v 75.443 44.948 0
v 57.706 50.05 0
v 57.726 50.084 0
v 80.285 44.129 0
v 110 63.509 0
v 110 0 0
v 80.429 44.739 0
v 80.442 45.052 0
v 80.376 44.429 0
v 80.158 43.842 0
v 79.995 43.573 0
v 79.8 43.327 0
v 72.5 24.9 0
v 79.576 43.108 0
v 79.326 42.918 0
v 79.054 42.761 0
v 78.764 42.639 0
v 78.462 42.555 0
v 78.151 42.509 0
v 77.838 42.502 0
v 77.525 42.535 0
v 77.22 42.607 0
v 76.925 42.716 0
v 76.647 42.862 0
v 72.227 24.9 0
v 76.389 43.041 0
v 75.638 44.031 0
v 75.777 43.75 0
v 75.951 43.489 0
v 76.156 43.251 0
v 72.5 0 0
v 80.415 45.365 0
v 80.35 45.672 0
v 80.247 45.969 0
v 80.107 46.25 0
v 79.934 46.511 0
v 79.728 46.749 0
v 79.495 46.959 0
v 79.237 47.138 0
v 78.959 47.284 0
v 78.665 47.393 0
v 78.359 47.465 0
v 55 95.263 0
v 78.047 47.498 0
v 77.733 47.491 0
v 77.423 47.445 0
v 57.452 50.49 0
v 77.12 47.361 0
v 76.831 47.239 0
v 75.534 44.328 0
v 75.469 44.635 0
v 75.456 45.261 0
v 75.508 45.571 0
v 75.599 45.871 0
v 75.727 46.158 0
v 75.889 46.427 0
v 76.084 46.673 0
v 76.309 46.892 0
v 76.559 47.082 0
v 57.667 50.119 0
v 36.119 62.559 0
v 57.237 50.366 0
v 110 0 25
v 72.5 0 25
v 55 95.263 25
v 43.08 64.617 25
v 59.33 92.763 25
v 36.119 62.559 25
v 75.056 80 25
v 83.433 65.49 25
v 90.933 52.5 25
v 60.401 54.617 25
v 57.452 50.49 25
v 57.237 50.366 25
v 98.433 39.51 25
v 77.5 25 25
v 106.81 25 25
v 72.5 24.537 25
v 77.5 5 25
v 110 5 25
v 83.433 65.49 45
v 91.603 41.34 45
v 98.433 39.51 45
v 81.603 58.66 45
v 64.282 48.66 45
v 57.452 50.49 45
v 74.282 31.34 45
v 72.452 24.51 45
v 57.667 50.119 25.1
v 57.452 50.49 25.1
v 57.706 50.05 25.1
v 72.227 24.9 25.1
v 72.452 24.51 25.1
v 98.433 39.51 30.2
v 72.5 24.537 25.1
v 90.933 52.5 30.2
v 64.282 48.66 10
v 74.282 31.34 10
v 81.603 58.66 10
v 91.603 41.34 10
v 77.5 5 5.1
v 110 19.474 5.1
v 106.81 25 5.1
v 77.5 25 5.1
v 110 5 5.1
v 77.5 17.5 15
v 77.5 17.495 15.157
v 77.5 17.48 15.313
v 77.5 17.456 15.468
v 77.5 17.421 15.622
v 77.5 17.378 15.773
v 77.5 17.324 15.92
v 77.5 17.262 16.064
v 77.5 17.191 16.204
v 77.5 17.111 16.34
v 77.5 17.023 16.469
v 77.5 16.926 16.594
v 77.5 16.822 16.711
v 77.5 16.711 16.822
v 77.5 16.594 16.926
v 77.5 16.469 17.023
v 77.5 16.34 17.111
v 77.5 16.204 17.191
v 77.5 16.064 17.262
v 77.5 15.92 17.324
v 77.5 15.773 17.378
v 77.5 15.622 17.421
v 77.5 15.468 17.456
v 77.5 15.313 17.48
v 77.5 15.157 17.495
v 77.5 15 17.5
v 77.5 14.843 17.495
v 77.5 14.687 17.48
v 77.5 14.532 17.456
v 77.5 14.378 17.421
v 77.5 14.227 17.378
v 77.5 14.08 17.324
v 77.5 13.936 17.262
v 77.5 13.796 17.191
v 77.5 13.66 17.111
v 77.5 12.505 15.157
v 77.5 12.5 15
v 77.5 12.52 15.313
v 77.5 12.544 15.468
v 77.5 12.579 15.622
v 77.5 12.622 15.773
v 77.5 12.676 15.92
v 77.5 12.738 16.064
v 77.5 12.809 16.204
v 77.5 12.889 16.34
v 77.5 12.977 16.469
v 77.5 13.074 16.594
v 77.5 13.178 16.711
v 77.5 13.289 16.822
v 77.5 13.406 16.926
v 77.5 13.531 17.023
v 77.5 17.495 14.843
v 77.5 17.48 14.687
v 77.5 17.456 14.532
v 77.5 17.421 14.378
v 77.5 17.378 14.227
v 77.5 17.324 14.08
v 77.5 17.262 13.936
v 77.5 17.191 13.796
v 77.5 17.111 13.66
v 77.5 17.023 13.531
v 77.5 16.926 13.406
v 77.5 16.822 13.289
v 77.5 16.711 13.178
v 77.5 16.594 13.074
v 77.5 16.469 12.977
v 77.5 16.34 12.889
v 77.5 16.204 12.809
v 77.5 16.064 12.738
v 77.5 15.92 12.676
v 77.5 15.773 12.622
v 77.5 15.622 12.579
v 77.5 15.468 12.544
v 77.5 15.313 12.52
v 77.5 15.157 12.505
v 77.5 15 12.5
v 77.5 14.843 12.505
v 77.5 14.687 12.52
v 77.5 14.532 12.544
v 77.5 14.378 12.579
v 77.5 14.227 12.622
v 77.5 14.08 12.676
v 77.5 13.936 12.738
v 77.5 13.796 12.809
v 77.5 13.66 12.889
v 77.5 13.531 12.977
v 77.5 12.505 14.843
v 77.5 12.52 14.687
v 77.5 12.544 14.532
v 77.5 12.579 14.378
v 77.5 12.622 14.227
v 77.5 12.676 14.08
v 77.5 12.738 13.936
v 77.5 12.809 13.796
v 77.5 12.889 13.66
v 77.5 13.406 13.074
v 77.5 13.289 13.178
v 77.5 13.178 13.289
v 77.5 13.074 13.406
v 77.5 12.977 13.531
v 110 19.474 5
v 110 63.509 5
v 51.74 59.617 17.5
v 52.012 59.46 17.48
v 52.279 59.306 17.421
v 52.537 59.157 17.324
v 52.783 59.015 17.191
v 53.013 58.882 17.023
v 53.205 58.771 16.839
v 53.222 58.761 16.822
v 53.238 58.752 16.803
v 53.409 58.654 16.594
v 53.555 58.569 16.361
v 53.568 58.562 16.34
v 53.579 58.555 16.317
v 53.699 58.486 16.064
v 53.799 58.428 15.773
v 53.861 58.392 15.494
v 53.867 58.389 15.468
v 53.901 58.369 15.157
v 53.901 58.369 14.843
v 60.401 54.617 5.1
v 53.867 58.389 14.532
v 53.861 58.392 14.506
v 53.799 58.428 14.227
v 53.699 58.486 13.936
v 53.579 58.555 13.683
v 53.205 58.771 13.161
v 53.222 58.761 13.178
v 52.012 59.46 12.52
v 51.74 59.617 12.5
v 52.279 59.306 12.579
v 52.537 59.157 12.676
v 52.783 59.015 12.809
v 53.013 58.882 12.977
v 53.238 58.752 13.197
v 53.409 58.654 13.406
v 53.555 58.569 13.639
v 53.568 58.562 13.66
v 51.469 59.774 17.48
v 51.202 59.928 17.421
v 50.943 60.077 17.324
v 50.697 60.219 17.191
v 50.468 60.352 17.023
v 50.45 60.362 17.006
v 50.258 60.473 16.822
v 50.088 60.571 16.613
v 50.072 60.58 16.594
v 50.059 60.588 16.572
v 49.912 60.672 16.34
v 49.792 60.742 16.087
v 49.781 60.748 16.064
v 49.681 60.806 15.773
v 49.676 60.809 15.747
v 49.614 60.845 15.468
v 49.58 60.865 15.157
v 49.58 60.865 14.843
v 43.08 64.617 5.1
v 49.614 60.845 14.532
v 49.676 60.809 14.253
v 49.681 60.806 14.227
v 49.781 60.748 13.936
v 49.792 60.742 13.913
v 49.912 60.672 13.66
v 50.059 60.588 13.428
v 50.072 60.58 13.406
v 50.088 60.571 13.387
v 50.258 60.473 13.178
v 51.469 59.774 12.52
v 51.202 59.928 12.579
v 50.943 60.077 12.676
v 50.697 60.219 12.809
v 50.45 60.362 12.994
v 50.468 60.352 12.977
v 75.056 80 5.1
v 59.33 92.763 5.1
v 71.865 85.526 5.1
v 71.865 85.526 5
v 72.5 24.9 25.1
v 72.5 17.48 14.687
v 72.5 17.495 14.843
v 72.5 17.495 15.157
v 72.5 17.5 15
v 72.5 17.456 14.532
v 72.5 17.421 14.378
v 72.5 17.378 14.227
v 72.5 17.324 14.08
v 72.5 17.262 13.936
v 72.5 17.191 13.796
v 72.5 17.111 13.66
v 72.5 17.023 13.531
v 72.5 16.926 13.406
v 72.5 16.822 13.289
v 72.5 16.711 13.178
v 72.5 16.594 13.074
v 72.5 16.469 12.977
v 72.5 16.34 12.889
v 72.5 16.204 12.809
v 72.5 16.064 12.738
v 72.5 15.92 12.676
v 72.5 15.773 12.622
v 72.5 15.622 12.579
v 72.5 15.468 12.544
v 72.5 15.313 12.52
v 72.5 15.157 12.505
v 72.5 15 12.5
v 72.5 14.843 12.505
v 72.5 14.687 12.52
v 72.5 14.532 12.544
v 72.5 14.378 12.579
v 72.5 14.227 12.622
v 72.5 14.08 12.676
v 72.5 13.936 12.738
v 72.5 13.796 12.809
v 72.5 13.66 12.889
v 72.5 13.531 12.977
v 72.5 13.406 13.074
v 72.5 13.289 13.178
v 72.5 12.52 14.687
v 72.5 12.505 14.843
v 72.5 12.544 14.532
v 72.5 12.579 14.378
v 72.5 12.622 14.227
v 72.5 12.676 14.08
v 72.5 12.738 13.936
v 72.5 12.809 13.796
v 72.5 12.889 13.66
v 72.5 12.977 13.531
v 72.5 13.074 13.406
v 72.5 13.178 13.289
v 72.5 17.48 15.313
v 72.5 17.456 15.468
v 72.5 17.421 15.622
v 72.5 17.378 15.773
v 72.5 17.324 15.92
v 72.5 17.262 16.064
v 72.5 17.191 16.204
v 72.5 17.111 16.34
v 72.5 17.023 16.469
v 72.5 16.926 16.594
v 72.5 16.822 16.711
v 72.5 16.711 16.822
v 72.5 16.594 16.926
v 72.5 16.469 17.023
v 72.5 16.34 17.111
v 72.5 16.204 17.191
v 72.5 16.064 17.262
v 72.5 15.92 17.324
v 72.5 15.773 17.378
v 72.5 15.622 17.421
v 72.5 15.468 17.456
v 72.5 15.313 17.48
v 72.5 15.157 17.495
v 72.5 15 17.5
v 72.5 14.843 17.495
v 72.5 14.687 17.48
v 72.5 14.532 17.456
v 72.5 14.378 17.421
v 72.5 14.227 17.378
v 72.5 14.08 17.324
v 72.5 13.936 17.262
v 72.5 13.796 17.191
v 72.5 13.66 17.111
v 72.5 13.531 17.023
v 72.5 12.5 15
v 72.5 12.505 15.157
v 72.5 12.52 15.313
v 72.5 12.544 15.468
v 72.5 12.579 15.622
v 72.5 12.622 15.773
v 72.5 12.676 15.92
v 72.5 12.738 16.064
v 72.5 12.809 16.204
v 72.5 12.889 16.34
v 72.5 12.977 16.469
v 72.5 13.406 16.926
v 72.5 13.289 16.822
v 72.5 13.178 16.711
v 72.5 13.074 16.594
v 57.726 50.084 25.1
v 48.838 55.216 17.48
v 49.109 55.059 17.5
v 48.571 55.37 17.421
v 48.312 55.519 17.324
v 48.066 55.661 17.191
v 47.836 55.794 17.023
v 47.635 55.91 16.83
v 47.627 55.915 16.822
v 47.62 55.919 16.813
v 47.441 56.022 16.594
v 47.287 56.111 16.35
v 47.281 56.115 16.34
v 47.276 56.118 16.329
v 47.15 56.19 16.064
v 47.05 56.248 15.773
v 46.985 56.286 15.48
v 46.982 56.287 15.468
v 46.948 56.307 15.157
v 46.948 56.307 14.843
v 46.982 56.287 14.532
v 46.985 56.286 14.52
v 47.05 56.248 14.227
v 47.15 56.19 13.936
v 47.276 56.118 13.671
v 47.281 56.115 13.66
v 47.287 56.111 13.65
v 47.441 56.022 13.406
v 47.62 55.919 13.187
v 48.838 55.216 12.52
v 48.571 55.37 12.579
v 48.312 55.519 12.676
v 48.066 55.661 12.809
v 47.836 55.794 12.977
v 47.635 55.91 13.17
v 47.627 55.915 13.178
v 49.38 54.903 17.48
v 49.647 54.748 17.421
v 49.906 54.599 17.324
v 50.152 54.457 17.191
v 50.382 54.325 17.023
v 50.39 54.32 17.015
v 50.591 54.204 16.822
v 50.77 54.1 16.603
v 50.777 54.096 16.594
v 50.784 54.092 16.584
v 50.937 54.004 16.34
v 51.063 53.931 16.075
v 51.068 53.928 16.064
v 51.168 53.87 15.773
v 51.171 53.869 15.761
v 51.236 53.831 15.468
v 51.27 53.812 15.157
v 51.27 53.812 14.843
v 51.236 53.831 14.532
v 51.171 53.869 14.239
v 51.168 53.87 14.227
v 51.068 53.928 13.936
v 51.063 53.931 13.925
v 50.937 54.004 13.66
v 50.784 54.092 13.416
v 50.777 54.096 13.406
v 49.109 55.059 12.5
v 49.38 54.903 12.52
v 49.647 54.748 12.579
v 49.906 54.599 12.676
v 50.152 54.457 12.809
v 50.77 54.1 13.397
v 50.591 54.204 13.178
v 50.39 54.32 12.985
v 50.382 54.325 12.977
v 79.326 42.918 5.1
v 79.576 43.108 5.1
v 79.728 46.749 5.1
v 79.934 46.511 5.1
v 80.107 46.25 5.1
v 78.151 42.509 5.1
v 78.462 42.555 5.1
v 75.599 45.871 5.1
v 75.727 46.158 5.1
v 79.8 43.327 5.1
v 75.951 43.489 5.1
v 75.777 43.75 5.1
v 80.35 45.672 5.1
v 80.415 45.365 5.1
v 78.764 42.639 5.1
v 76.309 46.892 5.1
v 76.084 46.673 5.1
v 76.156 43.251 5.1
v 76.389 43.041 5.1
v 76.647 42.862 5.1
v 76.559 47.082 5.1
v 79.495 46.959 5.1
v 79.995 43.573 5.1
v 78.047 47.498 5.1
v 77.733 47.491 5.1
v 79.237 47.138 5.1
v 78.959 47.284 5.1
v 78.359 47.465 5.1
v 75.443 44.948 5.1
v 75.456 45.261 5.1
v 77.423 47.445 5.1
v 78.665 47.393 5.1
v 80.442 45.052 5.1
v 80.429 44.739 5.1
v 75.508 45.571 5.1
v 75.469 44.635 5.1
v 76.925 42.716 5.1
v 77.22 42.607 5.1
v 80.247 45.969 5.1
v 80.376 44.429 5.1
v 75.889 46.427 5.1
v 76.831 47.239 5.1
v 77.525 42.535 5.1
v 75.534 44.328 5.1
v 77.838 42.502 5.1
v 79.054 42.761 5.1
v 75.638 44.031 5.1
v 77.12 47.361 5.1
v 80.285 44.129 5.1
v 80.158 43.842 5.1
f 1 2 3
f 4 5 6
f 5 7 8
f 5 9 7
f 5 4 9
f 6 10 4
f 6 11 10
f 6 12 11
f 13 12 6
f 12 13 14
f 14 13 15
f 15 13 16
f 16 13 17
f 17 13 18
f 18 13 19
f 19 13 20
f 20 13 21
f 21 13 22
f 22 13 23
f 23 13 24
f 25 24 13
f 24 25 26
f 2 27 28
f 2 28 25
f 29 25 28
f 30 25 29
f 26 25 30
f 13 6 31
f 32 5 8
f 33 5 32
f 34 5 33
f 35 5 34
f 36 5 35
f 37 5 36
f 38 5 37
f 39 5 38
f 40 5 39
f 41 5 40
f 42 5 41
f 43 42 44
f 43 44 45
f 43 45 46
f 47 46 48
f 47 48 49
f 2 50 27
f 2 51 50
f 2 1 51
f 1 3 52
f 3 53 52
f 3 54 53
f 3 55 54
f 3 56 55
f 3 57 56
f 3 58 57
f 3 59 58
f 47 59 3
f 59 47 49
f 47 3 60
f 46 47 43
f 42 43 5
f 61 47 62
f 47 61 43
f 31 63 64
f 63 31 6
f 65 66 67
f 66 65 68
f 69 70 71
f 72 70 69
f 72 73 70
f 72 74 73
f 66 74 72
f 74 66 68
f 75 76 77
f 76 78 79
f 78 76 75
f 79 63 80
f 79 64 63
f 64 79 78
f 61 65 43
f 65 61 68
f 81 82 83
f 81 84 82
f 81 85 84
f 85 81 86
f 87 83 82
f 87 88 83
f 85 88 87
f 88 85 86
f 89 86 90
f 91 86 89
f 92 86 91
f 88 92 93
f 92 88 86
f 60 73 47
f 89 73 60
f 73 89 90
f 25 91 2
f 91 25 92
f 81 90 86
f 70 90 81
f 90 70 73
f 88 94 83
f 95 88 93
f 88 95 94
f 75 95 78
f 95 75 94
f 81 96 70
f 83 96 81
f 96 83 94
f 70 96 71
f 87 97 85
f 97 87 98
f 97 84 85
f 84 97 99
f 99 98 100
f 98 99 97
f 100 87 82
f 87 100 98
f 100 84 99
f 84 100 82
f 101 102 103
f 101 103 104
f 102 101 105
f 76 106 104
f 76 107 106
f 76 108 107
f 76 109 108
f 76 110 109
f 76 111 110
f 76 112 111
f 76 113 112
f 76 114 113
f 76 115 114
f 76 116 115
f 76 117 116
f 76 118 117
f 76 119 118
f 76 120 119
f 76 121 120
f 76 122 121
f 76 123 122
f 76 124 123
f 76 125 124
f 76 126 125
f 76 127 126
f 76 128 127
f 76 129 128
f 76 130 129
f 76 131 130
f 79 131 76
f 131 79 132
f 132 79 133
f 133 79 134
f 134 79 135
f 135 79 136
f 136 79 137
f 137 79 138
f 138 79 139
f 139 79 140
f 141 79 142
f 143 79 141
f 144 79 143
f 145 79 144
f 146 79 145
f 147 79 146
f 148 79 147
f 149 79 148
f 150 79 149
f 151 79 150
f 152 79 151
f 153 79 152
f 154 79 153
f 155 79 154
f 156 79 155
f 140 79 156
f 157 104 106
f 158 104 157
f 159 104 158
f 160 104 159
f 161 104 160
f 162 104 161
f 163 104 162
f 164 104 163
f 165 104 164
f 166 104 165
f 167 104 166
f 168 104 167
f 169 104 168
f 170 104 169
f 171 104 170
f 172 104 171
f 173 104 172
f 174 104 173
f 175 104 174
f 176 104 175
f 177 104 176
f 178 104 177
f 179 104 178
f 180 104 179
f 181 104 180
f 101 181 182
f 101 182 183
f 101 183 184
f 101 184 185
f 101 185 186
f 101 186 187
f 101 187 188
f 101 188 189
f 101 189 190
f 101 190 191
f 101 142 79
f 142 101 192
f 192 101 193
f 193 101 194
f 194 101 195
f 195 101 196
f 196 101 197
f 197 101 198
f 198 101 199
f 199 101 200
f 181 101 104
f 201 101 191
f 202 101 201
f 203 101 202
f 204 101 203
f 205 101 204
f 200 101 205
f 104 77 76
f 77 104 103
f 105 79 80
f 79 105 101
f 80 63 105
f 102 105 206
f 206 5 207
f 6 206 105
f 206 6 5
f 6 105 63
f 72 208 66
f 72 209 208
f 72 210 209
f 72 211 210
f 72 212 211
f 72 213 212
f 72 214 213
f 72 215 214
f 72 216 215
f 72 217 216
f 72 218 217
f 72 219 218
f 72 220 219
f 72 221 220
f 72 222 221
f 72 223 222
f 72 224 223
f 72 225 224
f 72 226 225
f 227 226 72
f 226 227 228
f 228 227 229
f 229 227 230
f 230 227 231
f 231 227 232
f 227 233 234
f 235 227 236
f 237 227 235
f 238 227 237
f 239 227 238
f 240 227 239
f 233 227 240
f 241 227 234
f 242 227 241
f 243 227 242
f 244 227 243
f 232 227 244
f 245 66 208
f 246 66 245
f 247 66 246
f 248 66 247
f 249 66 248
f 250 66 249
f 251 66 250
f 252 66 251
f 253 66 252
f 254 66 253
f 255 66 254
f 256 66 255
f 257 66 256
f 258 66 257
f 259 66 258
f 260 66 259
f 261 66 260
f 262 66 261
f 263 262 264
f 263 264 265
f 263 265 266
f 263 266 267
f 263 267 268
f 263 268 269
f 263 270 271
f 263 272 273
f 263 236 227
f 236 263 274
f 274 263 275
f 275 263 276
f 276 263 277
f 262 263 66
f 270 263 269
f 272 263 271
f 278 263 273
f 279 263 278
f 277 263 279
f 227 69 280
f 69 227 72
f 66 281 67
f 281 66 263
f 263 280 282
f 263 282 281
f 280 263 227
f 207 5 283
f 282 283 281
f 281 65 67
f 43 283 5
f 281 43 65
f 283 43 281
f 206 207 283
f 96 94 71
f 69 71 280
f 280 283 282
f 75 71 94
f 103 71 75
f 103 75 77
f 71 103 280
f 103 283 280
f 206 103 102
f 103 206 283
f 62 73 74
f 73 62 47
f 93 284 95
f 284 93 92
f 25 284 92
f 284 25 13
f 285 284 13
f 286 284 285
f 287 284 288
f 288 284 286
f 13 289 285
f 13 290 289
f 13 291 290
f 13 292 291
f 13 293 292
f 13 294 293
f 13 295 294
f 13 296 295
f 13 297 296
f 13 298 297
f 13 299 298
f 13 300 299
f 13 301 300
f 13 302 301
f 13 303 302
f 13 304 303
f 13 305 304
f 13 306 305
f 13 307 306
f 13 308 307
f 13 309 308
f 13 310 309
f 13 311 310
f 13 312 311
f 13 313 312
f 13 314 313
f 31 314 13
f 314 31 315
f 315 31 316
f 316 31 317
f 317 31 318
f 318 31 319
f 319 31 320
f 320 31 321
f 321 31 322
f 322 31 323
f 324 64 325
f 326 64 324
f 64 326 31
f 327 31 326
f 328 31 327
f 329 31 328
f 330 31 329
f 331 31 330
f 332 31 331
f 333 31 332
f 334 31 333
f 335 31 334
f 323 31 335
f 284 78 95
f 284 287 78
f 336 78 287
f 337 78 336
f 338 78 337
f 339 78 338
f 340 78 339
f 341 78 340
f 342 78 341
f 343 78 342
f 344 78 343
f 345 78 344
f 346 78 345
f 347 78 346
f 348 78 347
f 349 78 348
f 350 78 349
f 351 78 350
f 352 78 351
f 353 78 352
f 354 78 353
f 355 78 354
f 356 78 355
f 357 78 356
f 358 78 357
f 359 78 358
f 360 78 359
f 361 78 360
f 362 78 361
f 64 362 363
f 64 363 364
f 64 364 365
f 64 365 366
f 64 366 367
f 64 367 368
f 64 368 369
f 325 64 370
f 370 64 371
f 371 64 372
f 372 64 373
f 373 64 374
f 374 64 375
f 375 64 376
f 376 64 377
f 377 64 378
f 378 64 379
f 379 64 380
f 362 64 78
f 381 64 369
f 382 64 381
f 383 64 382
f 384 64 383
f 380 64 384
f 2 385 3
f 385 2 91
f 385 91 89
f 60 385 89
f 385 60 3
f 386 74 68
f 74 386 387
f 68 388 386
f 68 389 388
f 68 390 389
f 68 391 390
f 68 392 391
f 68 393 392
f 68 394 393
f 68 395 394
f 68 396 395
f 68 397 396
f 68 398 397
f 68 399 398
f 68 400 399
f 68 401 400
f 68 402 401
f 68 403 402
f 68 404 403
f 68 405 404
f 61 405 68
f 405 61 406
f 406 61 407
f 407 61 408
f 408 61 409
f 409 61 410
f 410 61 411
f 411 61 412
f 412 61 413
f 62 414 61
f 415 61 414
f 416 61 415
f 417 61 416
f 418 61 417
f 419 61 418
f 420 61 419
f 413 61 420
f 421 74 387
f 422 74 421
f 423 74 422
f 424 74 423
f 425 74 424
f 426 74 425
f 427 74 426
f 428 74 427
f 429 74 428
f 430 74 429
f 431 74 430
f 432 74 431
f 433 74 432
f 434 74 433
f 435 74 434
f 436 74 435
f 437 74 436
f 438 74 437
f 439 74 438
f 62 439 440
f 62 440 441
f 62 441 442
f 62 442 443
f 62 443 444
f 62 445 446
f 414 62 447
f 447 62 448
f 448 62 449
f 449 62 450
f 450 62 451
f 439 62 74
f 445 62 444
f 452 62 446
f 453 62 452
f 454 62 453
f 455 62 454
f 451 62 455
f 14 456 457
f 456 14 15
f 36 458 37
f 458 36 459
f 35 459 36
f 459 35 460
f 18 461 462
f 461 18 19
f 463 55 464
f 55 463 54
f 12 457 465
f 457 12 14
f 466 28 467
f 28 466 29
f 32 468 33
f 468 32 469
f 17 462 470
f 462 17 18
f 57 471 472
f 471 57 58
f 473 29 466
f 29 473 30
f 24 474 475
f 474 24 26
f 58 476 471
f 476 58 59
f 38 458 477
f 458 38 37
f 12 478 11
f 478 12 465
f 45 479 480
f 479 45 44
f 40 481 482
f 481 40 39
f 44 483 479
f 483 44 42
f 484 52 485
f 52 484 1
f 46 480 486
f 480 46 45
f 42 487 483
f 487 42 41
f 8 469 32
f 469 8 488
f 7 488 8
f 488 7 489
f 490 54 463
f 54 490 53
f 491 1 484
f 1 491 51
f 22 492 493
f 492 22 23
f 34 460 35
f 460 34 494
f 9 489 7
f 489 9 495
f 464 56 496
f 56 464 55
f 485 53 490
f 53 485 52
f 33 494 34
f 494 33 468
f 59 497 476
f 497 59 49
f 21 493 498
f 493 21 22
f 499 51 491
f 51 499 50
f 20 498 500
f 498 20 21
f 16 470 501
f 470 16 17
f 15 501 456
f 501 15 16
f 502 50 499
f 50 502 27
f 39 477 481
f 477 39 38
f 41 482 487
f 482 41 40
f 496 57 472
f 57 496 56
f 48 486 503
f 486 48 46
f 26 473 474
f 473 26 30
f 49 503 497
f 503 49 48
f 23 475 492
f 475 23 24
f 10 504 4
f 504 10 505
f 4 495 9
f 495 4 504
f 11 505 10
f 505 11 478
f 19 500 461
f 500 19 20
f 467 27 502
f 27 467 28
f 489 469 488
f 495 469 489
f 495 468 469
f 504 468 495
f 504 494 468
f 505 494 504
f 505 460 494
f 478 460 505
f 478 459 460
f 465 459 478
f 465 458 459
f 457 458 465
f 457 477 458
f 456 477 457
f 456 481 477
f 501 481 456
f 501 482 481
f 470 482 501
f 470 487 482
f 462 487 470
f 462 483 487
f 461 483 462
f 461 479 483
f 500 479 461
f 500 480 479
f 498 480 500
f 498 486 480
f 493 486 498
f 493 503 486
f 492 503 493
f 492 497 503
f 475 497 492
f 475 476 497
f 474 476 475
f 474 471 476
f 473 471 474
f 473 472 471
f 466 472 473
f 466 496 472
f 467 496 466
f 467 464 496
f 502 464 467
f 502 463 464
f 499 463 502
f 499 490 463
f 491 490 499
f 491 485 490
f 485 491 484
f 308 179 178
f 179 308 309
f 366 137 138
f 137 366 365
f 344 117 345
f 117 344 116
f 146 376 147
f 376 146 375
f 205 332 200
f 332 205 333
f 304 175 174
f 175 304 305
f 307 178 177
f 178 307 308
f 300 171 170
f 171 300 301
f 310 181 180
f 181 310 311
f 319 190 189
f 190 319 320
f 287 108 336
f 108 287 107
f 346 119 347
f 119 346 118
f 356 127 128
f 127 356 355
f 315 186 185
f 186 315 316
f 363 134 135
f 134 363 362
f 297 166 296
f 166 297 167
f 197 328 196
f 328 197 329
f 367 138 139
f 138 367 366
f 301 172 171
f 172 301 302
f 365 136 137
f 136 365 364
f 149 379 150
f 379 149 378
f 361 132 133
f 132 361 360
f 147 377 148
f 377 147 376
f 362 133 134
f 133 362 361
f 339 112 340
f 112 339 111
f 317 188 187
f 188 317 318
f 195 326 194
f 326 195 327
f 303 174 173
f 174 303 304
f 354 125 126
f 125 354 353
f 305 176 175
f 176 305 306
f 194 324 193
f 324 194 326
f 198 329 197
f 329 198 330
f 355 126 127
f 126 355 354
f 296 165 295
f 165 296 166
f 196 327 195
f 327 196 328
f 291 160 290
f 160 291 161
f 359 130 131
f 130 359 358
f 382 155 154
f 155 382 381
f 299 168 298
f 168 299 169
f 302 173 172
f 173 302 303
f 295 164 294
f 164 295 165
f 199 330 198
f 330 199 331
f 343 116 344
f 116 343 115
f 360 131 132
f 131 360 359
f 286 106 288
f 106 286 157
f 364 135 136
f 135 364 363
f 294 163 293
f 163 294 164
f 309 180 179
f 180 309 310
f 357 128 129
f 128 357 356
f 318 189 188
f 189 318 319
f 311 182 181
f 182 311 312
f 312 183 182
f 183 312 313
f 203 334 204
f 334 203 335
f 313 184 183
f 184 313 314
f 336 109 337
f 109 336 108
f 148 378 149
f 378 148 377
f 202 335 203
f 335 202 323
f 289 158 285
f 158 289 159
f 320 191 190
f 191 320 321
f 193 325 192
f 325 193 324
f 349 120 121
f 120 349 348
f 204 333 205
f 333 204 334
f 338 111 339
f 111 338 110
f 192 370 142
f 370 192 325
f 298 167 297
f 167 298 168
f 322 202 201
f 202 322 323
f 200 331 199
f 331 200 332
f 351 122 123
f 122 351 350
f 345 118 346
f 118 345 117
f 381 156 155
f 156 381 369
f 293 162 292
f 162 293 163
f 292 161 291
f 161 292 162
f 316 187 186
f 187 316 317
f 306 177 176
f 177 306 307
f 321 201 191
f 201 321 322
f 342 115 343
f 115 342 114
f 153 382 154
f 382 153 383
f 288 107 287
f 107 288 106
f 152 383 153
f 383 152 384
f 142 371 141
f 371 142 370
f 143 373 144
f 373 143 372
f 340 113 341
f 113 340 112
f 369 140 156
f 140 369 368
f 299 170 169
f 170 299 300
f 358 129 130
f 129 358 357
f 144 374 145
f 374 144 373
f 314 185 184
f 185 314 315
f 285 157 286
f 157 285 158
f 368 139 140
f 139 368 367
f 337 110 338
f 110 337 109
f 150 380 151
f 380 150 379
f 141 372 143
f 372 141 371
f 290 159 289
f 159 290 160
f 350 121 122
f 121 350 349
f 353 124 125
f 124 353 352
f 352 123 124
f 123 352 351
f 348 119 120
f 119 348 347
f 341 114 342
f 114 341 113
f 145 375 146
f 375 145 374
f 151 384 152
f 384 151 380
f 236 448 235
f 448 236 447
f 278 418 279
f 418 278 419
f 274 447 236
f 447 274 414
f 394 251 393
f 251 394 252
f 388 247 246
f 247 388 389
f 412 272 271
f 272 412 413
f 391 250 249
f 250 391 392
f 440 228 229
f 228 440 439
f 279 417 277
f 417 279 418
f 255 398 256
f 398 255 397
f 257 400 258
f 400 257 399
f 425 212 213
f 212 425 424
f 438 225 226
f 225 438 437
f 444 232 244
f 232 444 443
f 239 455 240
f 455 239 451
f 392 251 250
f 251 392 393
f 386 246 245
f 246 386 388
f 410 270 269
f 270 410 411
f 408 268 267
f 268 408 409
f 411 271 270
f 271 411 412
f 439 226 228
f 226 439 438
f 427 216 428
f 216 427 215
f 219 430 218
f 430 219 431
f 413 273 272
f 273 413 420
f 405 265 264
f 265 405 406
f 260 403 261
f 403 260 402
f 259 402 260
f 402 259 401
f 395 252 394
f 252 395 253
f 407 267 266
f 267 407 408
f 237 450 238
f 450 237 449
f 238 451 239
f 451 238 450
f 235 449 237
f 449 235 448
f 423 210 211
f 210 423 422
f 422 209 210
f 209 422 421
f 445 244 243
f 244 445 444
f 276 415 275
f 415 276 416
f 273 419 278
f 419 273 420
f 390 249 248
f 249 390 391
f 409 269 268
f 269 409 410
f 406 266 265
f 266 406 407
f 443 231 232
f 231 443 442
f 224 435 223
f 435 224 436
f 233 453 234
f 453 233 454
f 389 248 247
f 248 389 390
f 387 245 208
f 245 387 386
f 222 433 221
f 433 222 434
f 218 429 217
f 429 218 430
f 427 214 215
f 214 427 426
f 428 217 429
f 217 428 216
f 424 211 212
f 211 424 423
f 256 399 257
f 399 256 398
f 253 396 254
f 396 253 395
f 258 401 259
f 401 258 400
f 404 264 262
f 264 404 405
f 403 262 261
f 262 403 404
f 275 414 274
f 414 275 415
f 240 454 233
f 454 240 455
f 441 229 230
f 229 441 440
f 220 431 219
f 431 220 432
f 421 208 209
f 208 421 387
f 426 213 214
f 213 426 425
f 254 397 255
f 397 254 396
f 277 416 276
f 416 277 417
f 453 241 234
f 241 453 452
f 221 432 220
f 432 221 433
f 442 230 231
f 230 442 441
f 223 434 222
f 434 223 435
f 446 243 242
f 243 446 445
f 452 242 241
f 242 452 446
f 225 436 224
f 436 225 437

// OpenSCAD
// file: functions.scad
$fn=50;

module offset_on_angle(angle,offset){
    x = offset * cos(angle);
    y = offset * sin(angle);
    translate([x,y,0])
    children();
}

module toroidic_skirt(id,od) {
    difference() {
        cylinder(d=od,h=(od-id)/2);
        translate([0,0,(od-id)/2])
        torus(id,id+(od-id)*2);
    }
}

module torus(id, od) {
    rotate_extrude(convexity=10)
    translate([id/2+(od - id)/4, 0, 0])
    circle(d = (od-id)/2);
}
// file: e2020.scad
module s2020(length) {
    color("silver")
    cube([20,20,length]);
}

module e2020(length) {
    color("silver")
    difference() {
        cube([20,20,length]);
        translate([10-5.4/2,-0.1,-0.1])
        cube([5.4,6.2,length+0.2]);
        translate([10-5.4/2,20-6.1,-0.1])
        cube([5.4,6.2,length+0.2]);
        
        translate([20-6.1,10-5.4/2,-0.1])
        cube([6.2,5.4,length+0.2]);
        
        translate([-0.1,10-5.4/2,-0.1])
        cube([6.2,5.4,length+0.2]);
        
        translate([10,10,-0.1])
        cylinder(d=4,h=length+0.2);
    }
}
// main file
// Top plate
$fn=100;
use <e2020.scad>;
use <functions.scad>;

triangle_size=150;
base_height = 25;
pillar_offset = 90;
pillar_sleeve_thickness = 5;
pillar_sleeve_height = 20;

top_plate();


module top_plate() {
    difference() {
        union() {
            base_triangle();
            pillar_sleeve();
        }

        pillar();        

        // back arm
        offset_on_angle(0,80-2.5)
        translate([0,5,25.1])
        rotate([0,90,0])
        s2020(200);

        // trim behind back arm
        color("red")
        offset_on_angle(0,110)
        translate([0,-10,-0.1])
        cube([40,100,base_height+0.2]);

        // bottom arm
        offset_on_angle(-30,5)
        offset_on_angle(60,80-2.5)
        offset_on_angle(-30,20)
        translate([0,0,25.1])
        rotate([-60,90,0])
        s2020(200);

        //trim behind bottom arm
        color("red")
        offset_on_angle(60,110)
        offset_on_angle(-30,90)
        translate([0,0,-0.1])
        rotate([0,0,60])
        cube([40,100,base_height+0.2]);

        // trim back
        color("red")
        offset_on_angle(30,105)
        offset_on_angle(120,50)
        translate([0,0,5])
        rotate([0,0,-60])
        cube([100,40,base_height+0.2]);

        color("teal")
        offset_on_angle(120,15)
        translate([0,0,-0.1])
        rotate([0,0,-60])
        cube([30,75,base_height+0.2]);

        color("lime")
        translate([0,25-0.1,-0.1])
        rotate([0,0,-90])
        cube([25,72.5,base_height+0.2]);

        color("lime")
        offset_on_angle(-30,12.5)
        translate([0,25.1,-0.1])
        rotate([0,0,-30])
        cube([25,52.5-2,base_height+0.2]);

        offset_on_angle(30, pillar_offset)
        rotate([0,0,30])
        translate([0,0,-0.1])
        cylinder(d=5,h=5.2);
    
        translate([72,15,15])
        rotate([0,90,0])
        cylinder(d=5,h=6);
        
        translate([0,0,15])
        offset_on_angle(-30,15)
        offset_on_angle(60,72)
        rotate([-60,90,0])
        cylinder(d=5,h=6);
    }
}

module pillar() {
    offset_on_angle(30, pillar_offset)
    rotate([0,0,30])
    translate([-10,-10,10])
    s2020(200);        
}

module pillar_sleeve() {
    offset_on_angle(30, pillar_offset)
    rotate([0,0,30])
    translate([-10-pillar_sleeve_thickness,-10-pillar_sleeve_thickness,base_height])
    cube([20+pillar_sleeve_thickness*2,20+pillar_sleeve_thickness*2,pillar_sleeve_height]); 
}

module base_triangle() {
    linear_extrude(height=base_height)
    polygon([
        [0,0],
        [triangle_size,0],
        [triangle_size/2,sqrt(triangle_size*triangle_size-(triangle_size/2)*(triangle_size/2))]
    ]);
}
